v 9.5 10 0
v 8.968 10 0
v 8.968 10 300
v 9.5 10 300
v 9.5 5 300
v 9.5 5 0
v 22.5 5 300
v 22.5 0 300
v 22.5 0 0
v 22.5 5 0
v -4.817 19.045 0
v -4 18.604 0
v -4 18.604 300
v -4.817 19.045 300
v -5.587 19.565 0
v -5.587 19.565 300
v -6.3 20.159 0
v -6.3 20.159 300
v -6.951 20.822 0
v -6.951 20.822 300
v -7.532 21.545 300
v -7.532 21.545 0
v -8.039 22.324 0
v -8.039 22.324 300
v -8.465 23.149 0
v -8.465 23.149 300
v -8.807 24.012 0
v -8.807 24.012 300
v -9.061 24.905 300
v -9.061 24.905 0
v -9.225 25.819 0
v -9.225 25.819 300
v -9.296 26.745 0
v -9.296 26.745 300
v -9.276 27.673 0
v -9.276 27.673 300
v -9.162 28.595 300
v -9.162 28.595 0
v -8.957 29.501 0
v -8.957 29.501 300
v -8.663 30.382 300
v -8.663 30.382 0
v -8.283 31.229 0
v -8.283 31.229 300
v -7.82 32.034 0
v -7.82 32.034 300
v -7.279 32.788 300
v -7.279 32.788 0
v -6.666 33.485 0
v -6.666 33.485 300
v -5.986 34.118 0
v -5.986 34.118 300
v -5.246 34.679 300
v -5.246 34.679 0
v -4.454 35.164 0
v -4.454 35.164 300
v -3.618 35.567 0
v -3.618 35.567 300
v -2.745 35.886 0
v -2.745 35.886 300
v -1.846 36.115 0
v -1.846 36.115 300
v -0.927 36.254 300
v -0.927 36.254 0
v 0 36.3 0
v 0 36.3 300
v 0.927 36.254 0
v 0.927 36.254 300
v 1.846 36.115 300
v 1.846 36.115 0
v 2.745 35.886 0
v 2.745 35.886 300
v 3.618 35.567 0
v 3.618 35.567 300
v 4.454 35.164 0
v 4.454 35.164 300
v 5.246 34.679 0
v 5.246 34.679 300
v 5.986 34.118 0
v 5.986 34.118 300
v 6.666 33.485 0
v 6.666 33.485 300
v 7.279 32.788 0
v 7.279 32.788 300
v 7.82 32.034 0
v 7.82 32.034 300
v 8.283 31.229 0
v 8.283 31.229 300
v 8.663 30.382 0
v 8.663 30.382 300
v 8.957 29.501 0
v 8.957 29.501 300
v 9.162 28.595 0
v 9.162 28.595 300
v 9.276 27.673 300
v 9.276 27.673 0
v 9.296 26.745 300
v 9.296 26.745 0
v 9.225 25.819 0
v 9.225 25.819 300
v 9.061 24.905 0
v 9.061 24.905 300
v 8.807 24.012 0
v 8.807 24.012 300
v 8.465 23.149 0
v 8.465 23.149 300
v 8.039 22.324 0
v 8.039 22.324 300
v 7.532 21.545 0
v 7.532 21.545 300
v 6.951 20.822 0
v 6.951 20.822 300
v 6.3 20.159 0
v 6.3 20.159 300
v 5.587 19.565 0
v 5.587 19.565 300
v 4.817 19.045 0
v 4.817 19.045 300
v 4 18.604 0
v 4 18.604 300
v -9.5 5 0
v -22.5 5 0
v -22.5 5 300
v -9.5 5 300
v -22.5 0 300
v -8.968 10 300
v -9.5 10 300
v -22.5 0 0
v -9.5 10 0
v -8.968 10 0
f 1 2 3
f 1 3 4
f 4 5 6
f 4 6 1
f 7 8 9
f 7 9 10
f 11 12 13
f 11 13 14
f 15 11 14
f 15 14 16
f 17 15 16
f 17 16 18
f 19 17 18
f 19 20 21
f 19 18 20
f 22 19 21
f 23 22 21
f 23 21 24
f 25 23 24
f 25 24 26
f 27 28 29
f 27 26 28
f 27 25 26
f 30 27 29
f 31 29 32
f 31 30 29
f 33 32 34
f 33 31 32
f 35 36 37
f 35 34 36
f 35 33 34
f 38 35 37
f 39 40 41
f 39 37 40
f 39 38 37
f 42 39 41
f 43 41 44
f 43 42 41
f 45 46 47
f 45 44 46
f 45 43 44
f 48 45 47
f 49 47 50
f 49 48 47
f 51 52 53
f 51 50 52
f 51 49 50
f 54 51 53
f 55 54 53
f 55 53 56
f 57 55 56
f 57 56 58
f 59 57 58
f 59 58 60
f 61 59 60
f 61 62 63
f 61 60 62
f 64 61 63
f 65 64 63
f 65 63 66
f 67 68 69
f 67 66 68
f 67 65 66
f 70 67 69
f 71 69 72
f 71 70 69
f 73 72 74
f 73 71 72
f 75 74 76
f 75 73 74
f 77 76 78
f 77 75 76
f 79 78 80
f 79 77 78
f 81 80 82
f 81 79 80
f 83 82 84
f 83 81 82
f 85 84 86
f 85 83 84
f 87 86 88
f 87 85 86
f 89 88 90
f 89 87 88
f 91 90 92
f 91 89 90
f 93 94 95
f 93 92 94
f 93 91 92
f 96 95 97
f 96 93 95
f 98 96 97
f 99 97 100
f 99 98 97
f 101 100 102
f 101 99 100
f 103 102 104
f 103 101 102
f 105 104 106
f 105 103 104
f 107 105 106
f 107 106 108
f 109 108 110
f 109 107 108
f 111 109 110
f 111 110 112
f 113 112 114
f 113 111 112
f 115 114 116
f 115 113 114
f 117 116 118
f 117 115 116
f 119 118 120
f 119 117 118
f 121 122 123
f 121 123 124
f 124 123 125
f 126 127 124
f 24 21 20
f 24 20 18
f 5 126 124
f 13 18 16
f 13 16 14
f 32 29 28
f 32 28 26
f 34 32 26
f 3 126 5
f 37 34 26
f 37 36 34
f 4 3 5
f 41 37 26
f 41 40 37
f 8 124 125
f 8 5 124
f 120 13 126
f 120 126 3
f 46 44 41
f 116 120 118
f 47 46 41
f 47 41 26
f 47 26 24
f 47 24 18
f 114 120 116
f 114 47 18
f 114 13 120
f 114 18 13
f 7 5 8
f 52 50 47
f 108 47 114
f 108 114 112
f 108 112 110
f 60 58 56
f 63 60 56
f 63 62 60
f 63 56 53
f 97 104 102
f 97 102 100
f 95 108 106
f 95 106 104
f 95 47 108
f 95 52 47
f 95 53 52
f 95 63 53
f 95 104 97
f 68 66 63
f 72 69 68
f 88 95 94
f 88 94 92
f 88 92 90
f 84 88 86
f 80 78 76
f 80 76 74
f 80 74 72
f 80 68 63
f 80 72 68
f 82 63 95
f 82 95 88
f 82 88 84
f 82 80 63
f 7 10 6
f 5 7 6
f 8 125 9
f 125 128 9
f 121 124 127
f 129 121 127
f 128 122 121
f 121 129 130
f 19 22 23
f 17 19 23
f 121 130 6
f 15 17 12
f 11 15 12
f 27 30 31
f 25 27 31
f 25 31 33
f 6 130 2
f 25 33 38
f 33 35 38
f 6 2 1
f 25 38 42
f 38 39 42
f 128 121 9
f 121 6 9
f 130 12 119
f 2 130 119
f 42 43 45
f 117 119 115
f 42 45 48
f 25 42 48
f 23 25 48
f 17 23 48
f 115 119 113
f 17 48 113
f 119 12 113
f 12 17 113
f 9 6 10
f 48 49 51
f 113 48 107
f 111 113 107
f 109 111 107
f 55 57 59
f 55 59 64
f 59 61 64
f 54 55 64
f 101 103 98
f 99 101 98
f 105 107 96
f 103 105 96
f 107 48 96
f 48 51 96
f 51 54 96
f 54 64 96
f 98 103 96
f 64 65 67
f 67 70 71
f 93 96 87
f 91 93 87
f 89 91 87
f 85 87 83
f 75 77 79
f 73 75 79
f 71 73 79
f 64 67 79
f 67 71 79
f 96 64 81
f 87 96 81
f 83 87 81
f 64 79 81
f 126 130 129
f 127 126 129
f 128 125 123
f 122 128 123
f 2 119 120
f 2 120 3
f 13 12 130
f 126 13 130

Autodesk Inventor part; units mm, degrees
ref_plane "YZ Plane" through (0, 0, 0) normal (1, 0, 0) x (0, 1, 0)
ref_plane "XZ Plane" through (0, 0, 0) normal (0, 1, 0) x (-1, 0, 0)
ref_plane "XY Plane" through (0, 0, 0) normal (0, 0, 1) x (1, 0, 0)
sketch "Sketch1" plane through (0, 0, 0) normal (0, 0, 1) x (1, 0, 0)
  line L0 (-22.5, 0) -> (22.5, 0)
  line L1 (22.5, 0) -> (22.5, 5)
  line L2 (-22.5, 0) -> (-22.5, 5)
  line L3 (-22.5, 5) -> (-9.5, 5)
  line L4 (22.5, 5) -> (9.5, 5)
  line L5 (-9.5, 5) -> (-9.5, 10)
  line L6 (9.5, 5) -> (9.5, 10)
  arc A0 (4, 18.6042) -> (-4, 18.6042) centre (0, 27) ccw
  line L7 (4, 18.6042) -> (8.9676, 10)
  line L8 (-4, 18.6042) -> (-8.9676, 10)
  line L9 (-9.5, 10) -> (9.5, 10) construction
  line L10 (-8.9676, 10) -> (-9.5, 10) construction
  line L11 (-8.9676, 10) -> (-9.5, 10)
  line L12 (8.9676, 10) -> (9.5, 10)
  line L13 (-11.4601, 5) -> (-11.4601, 0) construction
  line L14 (-16.9601, 5) -> (-16.9601, 0) construction
  line L15 (13.0399, 5) -> (13.0399, 0) construction
  line L16 (18.5399, 5) -> (18.5399, 0) construction
  arc A1 (-4, 18.6042) -> (4, 18.6042) centre (0, 27) ccw construction
  point P0 (0, 0)
  point P1 (0, 0)
  point P2 (0, 17.7)
  point P3 (15.7899, 5)
  point P4 (-14.2101, 5)
  dimension "B" = 45
  dimension "t" = 5
  dimension "d2" = 5
  dimension "dimensionf" = 19
  dimension "d4" = 13
  dimension "Y" = 10
  dimension "d6" = 5
  dimension "d" = 18.6
  dimension "e" = 22.5
  dimension "dimensionH" = 17.7
  dimension "dimensionh" = 27
  dimension "x" = 8
  dimension "d16" = 4
  dimension "dimensionc" = 30
  dimension "d21" = 6.7101
  dimension "s1" = 5.5
  dimension "d23" = 5.5
  dimension "d24" = 2.75
  dimension "d25" = 2.75
  dimension "d29" = 6
  dimension "d30" = 6
extrude "Extrusion1" add sketch "Sketch1" along normal blind 300
equation "\"d2\" = t"
equation "\"d16\" = 0.5 * x"
properties part number "sbr20_300mm"
